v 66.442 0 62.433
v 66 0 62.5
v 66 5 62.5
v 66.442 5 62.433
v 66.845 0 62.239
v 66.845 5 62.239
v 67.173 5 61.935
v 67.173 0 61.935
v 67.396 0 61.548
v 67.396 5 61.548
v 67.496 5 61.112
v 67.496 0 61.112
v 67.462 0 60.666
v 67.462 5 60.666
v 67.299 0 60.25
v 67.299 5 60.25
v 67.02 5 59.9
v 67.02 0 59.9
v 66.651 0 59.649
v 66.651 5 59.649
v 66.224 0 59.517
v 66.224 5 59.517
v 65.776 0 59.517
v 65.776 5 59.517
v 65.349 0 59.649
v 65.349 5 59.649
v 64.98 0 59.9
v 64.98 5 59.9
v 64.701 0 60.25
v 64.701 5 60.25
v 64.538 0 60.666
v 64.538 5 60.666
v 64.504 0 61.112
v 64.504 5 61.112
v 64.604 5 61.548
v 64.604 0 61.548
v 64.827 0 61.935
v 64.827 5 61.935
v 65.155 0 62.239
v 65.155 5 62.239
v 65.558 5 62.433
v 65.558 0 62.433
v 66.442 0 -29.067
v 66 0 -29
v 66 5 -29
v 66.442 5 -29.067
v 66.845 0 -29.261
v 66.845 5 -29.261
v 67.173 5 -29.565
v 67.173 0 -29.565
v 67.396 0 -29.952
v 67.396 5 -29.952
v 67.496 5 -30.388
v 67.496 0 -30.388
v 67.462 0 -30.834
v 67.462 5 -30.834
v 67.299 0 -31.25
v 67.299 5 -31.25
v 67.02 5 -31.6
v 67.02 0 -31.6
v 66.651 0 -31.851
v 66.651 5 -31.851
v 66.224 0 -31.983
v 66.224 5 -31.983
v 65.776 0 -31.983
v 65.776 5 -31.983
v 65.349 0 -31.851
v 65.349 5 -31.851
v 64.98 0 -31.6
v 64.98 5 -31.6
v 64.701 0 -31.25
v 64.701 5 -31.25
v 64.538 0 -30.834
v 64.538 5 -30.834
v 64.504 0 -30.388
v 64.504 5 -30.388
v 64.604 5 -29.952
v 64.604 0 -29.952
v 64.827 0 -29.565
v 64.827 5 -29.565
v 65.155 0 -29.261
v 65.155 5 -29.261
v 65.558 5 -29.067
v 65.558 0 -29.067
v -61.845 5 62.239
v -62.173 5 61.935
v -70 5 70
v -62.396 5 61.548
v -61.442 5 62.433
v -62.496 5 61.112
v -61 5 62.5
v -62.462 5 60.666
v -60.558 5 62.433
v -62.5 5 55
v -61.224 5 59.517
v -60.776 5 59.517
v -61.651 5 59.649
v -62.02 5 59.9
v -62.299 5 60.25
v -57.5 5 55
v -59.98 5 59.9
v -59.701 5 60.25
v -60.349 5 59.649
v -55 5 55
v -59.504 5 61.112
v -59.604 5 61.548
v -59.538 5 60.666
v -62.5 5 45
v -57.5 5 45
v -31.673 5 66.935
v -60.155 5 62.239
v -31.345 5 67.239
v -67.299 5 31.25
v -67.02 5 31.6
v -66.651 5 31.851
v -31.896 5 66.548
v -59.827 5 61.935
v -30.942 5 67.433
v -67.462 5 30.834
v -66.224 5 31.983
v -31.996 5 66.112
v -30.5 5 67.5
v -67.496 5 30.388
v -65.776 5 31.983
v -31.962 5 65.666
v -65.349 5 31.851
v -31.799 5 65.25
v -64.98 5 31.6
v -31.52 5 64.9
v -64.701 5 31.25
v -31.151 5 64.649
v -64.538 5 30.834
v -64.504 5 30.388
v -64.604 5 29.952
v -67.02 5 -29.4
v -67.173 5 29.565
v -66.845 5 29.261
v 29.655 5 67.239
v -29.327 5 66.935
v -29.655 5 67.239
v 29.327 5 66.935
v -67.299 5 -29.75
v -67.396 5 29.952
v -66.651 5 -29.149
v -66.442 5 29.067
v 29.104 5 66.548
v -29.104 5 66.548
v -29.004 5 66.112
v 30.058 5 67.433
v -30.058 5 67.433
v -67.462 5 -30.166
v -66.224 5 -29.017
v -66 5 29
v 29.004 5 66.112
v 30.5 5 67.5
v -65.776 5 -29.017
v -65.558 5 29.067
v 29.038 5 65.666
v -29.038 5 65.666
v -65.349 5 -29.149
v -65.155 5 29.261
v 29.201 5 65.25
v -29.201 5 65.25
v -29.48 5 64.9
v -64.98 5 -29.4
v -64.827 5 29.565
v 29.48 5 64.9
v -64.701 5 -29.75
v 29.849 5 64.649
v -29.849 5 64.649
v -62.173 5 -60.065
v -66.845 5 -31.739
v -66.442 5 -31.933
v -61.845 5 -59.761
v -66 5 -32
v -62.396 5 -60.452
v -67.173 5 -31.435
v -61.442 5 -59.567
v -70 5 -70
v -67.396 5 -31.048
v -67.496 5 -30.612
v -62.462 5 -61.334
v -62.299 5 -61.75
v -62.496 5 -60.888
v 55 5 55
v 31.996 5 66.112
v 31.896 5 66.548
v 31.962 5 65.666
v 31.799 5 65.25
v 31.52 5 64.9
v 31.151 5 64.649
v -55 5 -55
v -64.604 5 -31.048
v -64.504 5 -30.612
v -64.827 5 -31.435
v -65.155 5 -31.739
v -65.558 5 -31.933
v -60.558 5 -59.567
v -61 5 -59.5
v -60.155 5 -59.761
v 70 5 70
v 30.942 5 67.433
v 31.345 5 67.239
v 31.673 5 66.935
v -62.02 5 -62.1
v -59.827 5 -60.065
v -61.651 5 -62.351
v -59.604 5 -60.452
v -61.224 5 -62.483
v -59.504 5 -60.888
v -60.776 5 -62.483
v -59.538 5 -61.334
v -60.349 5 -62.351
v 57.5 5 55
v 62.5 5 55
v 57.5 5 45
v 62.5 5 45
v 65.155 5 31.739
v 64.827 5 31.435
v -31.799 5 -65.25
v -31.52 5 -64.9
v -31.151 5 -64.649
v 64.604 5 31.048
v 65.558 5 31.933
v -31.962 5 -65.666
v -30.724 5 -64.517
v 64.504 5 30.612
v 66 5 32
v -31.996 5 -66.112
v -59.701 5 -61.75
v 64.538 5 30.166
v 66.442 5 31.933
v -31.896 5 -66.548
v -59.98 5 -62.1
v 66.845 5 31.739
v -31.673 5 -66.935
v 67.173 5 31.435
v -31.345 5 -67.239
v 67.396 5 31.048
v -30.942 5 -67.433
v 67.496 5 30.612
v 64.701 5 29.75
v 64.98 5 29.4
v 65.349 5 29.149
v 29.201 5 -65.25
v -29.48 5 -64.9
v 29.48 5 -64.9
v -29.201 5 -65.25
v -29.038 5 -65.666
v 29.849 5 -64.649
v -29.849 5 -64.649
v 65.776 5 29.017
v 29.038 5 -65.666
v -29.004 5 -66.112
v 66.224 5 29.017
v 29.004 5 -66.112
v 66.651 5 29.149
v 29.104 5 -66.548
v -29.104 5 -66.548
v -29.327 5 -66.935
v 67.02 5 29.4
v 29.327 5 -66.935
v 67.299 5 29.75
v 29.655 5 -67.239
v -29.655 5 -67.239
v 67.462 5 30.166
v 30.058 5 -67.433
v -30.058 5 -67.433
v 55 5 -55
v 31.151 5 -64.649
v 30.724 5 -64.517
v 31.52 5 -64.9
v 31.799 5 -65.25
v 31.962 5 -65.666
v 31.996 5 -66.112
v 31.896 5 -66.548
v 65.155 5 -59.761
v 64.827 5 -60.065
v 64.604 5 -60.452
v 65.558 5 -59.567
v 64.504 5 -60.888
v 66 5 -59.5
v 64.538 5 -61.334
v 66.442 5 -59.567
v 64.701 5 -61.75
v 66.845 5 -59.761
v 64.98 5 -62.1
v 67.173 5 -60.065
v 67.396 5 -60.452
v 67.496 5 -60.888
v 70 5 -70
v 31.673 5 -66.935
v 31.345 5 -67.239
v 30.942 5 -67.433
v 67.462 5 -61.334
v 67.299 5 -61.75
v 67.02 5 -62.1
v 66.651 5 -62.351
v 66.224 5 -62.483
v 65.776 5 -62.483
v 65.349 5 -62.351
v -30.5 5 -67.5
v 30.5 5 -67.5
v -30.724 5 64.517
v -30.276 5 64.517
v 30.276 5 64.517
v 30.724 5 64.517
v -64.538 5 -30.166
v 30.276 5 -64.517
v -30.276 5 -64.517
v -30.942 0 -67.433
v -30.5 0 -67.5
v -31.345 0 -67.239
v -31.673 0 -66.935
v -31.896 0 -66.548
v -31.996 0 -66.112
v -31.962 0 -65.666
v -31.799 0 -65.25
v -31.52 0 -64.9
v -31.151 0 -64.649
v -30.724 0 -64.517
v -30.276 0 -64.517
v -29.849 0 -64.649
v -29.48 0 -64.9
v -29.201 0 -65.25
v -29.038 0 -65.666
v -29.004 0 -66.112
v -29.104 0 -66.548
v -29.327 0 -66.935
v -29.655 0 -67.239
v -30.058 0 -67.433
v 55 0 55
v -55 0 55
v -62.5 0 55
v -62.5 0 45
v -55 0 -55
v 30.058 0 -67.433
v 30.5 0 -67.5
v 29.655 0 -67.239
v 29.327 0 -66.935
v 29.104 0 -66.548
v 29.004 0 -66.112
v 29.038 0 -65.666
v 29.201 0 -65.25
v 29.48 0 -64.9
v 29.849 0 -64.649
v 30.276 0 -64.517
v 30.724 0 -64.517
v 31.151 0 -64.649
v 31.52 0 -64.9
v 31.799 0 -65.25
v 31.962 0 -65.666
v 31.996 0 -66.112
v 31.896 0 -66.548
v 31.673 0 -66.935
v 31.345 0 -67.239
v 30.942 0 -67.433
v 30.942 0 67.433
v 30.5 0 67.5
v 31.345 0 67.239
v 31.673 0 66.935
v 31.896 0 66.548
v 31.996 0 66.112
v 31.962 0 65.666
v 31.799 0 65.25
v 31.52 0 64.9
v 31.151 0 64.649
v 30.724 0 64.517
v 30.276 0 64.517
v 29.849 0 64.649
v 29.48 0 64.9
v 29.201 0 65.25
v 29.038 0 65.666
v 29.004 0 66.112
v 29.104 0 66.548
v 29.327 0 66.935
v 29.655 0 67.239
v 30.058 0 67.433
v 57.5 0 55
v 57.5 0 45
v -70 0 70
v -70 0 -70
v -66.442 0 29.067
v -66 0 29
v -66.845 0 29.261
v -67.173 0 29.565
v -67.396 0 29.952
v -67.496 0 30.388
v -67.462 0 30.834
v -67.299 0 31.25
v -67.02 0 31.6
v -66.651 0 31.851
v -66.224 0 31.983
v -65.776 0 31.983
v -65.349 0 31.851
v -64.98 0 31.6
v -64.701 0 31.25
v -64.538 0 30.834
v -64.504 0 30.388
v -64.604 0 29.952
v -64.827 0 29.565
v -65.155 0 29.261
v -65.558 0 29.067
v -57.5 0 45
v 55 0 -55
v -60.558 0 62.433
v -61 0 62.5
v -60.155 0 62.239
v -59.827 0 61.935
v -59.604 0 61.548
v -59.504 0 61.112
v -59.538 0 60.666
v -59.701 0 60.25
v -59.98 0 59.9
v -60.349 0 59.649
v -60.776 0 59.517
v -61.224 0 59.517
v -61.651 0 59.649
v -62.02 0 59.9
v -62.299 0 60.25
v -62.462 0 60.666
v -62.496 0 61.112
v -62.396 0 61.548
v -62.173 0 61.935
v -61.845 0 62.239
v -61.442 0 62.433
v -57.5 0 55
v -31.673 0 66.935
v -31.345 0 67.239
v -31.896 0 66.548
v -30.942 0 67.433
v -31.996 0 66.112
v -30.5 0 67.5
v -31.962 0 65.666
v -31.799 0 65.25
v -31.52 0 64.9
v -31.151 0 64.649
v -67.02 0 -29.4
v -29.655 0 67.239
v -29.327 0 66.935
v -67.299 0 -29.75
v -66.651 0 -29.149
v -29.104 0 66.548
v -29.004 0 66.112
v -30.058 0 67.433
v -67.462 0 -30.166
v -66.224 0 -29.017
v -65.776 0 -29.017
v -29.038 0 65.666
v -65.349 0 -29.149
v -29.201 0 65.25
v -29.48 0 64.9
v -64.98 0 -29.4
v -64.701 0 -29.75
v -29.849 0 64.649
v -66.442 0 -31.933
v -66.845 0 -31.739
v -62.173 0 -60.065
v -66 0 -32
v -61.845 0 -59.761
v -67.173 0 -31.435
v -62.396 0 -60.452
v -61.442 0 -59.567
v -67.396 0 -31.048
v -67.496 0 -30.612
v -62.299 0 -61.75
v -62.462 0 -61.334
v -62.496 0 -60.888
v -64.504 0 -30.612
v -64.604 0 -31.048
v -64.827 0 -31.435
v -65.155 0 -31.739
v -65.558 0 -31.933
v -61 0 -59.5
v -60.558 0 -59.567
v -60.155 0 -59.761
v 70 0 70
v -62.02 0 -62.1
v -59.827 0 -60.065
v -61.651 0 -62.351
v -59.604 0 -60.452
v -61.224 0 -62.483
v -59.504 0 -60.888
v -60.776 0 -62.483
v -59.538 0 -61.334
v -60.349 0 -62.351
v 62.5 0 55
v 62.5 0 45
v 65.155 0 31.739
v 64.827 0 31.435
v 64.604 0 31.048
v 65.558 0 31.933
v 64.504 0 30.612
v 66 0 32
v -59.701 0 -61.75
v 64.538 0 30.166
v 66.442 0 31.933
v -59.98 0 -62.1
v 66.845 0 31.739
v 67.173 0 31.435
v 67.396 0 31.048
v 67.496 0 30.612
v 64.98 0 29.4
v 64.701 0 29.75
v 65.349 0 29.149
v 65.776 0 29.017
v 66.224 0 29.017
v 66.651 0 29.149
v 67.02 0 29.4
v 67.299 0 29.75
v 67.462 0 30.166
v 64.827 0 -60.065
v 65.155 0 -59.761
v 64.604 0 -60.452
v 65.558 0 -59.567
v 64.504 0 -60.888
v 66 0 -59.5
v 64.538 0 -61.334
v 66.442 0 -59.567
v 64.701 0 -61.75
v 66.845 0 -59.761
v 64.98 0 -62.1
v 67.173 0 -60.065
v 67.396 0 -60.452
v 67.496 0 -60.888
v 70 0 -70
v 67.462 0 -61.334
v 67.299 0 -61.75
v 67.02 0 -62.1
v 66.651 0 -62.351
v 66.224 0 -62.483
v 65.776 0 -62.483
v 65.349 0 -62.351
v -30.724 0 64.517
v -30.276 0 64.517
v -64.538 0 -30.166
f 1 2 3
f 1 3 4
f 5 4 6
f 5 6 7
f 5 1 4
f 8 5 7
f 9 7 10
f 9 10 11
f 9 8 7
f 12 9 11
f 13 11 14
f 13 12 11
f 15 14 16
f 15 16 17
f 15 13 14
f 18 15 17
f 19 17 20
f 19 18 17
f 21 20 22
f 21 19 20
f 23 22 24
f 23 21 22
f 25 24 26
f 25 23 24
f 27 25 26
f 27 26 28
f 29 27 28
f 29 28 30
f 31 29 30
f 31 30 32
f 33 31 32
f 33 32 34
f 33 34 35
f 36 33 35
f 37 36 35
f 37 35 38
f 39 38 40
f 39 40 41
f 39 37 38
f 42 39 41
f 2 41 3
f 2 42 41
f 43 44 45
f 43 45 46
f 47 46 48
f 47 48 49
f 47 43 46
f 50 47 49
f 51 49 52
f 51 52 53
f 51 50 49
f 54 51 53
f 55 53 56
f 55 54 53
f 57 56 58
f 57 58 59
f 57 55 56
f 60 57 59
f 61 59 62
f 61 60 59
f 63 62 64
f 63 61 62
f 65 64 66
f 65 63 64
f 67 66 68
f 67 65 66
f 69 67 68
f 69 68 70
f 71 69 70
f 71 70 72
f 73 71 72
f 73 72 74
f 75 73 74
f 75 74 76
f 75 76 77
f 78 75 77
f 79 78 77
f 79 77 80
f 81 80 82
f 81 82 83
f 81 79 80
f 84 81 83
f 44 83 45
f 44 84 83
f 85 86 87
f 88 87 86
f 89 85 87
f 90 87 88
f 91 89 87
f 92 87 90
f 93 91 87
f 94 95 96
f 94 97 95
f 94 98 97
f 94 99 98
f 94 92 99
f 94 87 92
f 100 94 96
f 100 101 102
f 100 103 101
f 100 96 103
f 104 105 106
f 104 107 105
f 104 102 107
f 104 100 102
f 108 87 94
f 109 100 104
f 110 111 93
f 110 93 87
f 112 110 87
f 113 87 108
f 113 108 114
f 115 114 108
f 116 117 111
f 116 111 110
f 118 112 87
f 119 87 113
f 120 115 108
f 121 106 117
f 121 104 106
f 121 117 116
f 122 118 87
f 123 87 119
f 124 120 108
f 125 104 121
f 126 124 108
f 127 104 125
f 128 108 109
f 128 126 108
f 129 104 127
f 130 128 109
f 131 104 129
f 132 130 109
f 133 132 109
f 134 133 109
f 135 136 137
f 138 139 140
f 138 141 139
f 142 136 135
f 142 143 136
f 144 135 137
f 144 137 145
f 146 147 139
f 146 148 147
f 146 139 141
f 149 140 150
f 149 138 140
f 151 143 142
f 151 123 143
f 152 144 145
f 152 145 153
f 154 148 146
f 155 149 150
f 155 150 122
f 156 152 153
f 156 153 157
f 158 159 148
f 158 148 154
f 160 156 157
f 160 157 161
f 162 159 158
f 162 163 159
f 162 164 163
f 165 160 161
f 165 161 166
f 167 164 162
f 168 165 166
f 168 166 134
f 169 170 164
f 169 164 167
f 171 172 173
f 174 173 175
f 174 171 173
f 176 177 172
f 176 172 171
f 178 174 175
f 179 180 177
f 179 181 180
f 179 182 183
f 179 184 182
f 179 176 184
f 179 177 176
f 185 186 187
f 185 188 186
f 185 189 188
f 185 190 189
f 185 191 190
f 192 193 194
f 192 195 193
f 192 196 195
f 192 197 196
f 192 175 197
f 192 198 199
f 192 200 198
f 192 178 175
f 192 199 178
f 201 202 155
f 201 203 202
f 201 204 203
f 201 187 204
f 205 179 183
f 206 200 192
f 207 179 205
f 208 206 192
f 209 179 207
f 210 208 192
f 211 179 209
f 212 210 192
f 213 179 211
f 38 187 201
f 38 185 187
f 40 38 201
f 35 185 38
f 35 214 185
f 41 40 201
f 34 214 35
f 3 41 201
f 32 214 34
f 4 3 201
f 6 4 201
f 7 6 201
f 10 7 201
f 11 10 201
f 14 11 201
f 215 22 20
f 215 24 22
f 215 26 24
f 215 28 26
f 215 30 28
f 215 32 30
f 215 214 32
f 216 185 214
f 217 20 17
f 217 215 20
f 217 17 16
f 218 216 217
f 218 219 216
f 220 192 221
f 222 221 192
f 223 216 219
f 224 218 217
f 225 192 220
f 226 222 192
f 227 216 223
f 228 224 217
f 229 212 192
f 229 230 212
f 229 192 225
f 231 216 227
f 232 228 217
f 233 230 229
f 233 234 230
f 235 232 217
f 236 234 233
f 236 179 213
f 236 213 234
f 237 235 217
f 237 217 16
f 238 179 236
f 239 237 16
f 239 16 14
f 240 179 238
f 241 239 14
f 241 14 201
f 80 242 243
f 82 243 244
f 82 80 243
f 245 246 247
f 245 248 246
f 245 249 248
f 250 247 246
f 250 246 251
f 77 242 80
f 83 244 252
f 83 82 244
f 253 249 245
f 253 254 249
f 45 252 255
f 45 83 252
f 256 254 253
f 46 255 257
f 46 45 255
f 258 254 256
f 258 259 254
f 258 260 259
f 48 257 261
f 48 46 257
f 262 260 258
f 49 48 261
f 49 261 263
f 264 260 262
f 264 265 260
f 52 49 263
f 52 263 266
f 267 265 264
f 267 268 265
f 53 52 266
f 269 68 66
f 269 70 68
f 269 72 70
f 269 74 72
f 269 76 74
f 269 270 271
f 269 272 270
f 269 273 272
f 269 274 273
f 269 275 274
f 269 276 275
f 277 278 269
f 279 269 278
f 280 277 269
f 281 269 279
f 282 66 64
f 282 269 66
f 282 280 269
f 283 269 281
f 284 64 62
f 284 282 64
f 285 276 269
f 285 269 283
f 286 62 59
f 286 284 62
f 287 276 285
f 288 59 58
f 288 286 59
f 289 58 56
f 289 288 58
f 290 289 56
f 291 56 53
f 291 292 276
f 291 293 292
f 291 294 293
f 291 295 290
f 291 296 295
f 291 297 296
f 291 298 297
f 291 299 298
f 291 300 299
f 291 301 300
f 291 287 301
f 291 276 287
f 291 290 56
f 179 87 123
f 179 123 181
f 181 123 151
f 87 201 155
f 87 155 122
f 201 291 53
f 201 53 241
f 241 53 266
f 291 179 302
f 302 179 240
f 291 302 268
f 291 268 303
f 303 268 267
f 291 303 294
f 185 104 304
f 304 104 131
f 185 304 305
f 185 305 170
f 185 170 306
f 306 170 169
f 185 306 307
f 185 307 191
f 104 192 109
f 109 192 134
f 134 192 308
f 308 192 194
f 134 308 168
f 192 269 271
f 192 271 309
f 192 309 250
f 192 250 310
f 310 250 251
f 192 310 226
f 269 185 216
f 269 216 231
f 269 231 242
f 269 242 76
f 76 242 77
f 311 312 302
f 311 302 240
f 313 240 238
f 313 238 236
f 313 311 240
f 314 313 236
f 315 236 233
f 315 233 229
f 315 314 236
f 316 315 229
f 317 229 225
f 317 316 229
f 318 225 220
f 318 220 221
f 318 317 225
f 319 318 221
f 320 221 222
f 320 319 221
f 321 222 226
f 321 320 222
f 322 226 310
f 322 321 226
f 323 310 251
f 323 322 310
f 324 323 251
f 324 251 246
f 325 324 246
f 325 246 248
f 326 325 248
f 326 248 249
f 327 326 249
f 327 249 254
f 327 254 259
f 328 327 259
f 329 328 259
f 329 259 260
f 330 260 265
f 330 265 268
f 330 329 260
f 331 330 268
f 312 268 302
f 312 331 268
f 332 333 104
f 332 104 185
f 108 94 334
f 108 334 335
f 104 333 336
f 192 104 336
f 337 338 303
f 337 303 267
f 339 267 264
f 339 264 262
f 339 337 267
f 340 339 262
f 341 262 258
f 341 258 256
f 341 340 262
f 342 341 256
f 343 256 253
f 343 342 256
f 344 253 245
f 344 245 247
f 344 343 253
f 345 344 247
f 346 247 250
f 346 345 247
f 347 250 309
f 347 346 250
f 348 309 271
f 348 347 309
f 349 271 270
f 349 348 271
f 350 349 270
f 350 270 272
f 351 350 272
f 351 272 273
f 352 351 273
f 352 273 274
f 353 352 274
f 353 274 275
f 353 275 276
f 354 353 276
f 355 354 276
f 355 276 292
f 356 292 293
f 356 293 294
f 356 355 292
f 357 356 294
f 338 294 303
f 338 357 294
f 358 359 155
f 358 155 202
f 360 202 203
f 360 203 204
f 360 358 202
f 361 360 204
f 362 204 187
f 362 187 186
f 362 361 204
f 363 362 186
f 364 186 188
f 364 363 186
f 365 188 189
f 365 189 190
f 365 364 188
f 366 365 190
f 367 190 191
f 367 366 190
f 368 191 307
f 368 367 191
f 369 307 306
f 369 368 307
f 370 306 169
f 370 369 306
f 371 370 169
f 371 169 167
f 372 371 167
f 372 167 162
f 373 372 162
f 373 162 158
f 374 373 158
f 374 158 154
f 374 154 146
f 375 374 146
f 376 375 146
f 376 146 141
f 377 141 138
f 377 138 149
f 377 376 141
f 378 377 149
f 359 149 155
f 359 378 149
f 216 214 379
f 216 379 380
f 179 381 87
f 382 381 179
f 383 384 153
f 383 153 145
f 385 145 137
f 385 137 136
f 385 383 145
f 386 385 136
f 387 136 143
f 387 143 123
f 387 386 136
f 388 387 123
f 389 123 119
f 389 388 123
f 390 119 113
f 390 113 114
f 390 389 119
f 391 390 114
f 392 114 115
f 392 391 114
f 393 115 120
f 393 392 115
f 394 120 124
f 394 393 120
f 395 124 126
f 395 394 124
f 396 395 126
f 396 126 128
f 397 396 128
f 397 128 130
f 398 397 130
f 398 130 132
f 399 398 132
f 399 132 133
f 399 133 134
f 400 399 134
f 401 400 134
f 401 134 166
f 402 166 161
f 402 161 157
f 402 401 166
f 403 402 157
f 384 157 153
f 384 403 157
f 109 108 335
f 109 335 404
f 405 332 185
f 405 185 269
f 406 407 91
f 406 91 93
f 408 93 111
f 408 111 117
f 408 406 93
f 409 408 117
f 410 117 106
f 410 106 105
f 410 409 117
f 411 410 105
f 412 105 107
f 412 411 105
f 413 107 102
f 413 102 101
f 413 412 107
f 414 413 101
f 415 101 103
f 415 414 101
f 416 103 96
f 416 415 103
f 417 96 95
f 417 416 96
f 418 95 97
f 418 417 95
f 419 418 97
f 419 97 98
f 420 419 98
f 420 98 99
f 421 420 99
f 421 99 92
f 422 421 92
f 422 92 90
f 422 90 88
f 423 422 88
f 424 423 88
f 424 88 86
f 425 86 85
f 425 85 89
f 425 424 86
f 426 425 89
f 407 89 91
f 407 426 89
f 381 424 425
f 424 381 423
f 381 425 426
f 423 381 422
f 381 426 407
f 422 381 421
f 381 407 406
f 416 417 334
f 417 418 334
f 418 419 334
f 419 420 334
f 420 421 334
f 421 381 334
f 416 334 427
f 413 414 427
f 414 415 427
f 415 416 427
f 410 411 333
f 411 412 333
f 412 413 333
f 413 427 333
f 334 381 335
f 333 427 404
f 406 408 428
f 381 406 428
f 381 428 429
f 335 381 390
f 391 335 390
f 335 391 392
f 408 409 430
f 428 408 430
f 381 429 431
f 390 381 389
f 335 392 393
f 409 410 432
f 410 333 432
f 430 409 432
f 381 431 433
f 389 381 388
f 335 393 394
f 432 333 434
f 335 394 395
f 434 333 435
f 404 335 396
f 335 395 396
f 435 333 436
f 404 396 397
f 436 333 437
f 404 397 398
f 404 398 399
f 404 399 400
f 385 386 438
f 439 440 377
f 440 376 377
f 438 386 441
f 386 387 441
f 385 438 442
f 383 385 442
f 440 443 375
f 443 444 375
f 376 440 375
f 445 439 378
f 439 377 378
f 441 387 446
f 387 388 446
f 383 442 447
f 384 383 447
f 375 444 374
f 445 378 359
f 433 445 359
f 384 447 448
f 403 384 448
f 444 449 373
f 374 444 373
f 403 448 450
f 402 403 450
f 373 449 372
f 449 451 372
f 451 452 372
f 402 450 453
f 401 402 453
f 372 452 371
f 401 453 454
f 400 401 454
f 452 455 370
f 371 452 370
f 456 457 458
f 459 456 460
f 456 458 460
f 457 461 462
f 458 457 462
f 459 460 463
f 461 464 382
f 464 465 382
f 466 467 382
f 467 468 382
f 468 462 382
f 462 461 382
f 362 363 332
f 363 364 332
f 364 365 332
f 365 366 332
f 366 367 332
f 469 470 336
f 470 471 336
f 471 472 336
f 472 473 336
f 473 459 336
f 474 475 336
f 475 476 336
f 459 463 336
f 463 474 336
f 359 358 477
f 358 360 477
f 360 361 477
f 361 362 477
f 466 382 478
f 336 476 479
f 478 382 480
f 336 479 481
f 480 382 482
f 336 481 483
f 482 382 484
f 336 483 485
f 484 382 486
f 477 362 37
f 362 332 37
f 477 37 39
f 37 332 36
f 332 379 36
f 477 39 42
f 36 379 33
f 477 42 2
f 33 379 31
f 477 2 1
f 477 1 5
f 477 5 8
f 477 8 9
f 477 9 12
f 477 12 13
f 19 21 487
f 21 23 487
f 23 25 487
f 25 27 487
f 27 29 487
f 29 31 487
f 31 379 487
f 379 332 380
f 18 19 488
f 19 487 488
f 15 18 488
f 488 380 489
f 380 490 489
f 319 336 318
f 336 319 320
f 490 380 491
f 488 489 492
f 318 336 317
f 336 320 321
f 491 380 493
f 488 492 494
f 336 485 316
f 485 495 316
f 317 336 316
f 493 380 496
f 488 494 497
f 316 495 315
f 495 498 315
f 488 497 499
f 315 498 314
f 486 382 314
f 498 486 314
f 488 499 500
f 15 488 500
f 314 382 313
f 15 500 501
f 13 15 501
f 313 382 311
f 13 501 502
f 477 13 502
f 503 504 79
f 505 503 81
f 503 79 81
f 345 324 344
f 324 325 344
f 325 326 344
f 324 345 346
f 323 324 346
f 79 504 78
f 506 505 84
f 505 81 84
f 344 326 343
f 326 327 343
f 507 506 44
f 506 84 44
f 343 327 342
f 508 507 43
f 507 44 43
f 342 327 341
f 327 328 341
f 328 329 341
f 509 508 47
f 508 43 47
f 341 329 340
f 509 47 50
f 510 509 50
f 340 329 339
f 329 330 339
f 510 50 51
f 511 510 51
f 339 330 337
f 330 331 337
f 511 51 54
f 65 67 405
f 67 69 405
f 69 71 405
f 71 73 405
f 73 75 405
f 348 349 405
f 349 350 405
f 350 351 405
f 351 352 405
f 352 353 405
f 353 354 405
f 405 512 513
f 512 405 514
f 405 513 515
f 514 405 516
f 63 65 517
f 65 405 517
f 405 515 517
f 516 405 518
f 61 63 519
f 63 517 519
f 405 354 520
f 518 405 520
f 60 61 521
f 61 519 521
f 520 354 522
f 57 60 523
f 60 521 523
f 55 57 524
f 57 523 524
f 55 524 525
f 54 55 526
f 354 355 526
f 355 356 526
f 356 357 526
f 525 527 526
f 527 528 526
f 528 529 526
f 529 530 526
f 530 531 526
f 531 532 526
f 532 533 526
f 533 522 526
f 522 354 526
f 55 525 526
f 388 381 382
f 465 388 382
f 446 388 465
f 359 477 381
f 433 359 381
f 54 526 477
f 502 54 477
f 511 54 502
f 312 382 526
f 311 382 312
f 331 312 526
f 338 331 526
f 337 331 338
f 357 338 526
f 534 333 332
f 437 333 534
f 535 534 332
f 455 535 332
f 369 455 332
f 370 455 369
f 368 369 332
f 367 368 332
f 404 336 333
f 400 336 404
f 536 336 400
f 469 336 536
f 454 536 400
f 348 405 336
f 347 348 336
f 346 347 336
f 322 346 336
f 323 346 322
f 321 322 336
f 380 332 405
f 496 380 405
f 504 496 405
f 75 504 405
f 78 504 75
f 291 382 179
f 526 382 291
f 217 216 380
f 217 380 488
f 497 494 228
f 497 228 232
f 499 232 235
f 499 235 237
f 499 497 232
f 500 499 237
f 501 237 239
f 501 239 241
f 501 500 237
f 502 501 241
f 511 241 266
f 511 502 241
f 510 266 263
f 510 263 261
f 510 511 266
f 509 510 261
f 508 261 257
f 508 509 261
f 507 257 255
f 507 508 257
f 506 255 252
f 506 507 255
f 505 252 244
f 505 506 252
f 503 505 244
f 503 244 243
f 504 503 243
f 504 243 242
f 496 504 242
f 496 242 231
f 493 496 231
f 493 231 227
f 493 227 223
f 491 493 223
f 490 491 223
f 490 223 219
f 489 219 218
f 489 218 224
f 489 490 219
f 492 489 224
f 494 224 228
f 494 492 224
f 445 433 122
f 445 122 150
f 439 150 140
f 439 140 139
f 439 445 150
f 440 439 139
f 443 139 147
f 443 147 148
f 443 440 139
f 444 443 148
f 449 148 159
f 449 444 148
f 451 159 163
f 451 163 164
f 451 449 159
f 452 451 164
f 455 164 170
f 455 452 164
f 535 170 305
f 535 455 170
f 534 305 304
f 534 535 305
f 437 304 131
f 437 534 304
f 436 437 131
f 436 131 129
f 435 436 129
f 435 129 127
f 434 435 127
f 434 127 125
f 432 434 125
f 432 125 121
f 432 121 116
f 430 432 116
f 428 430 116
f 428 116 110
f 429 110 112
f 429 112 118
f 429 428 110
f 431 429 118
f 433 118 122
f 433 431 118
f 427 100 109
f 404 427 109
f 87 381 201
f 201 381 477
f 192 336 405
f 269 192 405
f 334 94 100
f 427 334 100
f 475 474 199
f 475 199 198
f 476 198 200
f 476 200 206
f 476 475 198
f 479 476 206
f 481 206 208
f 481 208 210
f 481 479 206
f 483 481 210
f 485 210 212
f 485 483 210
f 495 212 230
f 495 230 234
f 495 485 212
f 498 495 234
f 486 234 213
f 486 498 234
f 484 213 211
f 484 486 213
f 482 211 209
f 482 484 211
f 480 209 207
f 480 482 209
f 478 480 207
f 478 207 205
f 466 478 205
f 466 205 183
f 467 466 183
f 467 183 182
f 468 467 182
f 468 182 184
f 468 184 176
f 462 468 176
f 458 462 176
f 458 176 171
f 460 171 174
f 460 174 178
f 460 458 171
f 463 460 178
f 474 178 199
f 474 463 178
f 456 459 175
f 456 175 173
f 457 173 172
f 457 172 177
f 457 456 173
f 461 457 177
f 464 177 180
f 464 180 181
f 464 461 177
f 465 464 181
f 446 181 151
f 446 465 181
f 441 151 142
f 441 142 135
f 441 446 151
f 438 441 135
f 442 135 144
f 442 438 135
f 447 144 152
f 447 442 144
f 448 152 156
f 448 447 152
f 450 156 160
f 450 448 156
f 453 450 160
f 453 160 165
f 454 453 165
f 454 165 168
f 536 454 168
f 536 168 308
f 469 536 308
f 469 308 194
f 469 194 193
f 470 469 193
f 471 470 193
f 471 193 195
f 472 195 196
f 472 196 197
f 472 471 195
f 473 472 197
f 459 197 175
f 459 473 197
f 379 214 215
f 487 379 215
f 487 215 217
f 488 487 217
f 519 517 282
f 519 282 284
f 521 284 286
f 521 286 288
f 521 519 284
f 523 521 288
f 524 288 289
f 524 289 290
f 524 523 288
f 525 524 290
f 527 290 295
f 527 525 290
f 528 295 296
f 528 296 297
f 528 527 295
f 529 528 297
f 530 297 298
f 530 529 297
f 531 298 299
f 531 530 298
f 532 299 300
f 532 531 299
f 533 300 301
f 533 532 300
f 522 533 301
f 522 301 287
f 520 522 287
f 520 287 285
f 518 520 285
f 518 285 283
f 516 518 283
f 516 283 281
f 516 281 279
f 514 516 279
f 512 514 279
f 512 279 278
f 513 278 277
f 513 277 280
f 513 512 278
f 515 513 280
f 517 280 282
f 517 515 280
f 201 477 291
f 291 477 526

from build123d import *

# Parameters (mm, degrees)
CROQUIS1_W              = 140
CROQUIS1_H              = 140
CROQUIS1_R              = 1.5
CROQUIS1_W_2            = 110
CROQUIS1_H_2            = 110
SALIENTE_EXTRUIR1_DEPTH = 5
CROQUIS2_W              = 5
CROQUIS2_H              = 10
CORTAR_EXTRUIR1_DEPTH   = 5


with BuildPart() as part:
    # Croquis1 → Saliente-Extruir1 (new body)
    with BuildSketch(Plane(origin=(0, 0, 0), x_dir=(1, 0, 0), z_dir=(0, 1, 0))):
        Rectangle(CROQUIS1_W, CROQUIS1_H)
        with Locations(Location((-61, 61, 0), (0, 0, 270))):
            Circle(CROQUIS1_R, mode=Mode.SUBTRACT)
        with Locations(Location((66, 61, 0), (0, 0, 270))):
            Circle(CROQUIS1_R, mode=Mode.SUBTRACT)
        with Locations(Location((66, -61, 0), (0, 0, 270))):
            Circle(CROQUIS1_R, mode=Mode.SUBTRACT)
        with Locations(Location((-61, -61, 0), (0, 0, 270))):
            Circle(CROQUIS1_R, mode=Mode.SUBTRACT)
        with Locations(Location((66, 30.5, 0), (0, 0, 270))):
            Circle(CROQUIS1_R, mode=Mode.SUBTRACT)
        with Locations(Location((66, -30.5, 0), (0, 0, 270))):
            Circle(CROQUIS1_R, mode=Mode.SUBTRACT)
        with Locations(Location((-30.5, -66, 0), (0, 0, 270))):
            Circle(CROQUIS1_R, mode=Mode.SUBTRACT)
        with Locations(Location((30.5, -66, 0), (0, 0, 270))):
            Circle(CROQUIS1_R, mode=Mode.SUBTRACT)
        with Locations(Location((-30.5, 66, 0), (0, 0, 90))):
            Circle(CROQUIS1_R, mode=Mode.SUBTRACT)
        with Locations(Location((30.5, 66, 0), (0, 0, 90))):
            Circle(CROQUIS1_R, mode=Mode.SUBTRACT)
        with Locations(Location((-66, 30.5, 0), (0, 0, 90))):
            Circle(CROQUIS1_R, mode=Mode.SUBTRACT)
        with Locations(Location((-66, -30.5, 0), (0, 0, 90))):
            Circle(CROQUIS1_R, mode=Mode.SUBTRACT)
        Rectangle(CROQUIS1_W_2, CROQUIS1_H_2, mode=Mode.SUBTRACT)
    extrude(amount=SALIENTE_EXTRUIR1_DEPTH)

    # Croquis2 → Cortar-Extruir1 (cut)
    with BuildSketch(Plane(origin=(0, 5, 0), x_dir=(1, 0, 0), z_dir=(0, 1, 0))):
        with Locations((60, -50)):
            Rectangle(CROQUIS2_W, CROQUIS2_H)
        with Locations((-60, -50)):
            Rectangle(CROQUIS2_W, CROQUIS2_H)
    extrude(amount=-CORTAR_EXTRUIR1_DEPTH, mode=Mode.SUBTRACT)


solid = part.part
